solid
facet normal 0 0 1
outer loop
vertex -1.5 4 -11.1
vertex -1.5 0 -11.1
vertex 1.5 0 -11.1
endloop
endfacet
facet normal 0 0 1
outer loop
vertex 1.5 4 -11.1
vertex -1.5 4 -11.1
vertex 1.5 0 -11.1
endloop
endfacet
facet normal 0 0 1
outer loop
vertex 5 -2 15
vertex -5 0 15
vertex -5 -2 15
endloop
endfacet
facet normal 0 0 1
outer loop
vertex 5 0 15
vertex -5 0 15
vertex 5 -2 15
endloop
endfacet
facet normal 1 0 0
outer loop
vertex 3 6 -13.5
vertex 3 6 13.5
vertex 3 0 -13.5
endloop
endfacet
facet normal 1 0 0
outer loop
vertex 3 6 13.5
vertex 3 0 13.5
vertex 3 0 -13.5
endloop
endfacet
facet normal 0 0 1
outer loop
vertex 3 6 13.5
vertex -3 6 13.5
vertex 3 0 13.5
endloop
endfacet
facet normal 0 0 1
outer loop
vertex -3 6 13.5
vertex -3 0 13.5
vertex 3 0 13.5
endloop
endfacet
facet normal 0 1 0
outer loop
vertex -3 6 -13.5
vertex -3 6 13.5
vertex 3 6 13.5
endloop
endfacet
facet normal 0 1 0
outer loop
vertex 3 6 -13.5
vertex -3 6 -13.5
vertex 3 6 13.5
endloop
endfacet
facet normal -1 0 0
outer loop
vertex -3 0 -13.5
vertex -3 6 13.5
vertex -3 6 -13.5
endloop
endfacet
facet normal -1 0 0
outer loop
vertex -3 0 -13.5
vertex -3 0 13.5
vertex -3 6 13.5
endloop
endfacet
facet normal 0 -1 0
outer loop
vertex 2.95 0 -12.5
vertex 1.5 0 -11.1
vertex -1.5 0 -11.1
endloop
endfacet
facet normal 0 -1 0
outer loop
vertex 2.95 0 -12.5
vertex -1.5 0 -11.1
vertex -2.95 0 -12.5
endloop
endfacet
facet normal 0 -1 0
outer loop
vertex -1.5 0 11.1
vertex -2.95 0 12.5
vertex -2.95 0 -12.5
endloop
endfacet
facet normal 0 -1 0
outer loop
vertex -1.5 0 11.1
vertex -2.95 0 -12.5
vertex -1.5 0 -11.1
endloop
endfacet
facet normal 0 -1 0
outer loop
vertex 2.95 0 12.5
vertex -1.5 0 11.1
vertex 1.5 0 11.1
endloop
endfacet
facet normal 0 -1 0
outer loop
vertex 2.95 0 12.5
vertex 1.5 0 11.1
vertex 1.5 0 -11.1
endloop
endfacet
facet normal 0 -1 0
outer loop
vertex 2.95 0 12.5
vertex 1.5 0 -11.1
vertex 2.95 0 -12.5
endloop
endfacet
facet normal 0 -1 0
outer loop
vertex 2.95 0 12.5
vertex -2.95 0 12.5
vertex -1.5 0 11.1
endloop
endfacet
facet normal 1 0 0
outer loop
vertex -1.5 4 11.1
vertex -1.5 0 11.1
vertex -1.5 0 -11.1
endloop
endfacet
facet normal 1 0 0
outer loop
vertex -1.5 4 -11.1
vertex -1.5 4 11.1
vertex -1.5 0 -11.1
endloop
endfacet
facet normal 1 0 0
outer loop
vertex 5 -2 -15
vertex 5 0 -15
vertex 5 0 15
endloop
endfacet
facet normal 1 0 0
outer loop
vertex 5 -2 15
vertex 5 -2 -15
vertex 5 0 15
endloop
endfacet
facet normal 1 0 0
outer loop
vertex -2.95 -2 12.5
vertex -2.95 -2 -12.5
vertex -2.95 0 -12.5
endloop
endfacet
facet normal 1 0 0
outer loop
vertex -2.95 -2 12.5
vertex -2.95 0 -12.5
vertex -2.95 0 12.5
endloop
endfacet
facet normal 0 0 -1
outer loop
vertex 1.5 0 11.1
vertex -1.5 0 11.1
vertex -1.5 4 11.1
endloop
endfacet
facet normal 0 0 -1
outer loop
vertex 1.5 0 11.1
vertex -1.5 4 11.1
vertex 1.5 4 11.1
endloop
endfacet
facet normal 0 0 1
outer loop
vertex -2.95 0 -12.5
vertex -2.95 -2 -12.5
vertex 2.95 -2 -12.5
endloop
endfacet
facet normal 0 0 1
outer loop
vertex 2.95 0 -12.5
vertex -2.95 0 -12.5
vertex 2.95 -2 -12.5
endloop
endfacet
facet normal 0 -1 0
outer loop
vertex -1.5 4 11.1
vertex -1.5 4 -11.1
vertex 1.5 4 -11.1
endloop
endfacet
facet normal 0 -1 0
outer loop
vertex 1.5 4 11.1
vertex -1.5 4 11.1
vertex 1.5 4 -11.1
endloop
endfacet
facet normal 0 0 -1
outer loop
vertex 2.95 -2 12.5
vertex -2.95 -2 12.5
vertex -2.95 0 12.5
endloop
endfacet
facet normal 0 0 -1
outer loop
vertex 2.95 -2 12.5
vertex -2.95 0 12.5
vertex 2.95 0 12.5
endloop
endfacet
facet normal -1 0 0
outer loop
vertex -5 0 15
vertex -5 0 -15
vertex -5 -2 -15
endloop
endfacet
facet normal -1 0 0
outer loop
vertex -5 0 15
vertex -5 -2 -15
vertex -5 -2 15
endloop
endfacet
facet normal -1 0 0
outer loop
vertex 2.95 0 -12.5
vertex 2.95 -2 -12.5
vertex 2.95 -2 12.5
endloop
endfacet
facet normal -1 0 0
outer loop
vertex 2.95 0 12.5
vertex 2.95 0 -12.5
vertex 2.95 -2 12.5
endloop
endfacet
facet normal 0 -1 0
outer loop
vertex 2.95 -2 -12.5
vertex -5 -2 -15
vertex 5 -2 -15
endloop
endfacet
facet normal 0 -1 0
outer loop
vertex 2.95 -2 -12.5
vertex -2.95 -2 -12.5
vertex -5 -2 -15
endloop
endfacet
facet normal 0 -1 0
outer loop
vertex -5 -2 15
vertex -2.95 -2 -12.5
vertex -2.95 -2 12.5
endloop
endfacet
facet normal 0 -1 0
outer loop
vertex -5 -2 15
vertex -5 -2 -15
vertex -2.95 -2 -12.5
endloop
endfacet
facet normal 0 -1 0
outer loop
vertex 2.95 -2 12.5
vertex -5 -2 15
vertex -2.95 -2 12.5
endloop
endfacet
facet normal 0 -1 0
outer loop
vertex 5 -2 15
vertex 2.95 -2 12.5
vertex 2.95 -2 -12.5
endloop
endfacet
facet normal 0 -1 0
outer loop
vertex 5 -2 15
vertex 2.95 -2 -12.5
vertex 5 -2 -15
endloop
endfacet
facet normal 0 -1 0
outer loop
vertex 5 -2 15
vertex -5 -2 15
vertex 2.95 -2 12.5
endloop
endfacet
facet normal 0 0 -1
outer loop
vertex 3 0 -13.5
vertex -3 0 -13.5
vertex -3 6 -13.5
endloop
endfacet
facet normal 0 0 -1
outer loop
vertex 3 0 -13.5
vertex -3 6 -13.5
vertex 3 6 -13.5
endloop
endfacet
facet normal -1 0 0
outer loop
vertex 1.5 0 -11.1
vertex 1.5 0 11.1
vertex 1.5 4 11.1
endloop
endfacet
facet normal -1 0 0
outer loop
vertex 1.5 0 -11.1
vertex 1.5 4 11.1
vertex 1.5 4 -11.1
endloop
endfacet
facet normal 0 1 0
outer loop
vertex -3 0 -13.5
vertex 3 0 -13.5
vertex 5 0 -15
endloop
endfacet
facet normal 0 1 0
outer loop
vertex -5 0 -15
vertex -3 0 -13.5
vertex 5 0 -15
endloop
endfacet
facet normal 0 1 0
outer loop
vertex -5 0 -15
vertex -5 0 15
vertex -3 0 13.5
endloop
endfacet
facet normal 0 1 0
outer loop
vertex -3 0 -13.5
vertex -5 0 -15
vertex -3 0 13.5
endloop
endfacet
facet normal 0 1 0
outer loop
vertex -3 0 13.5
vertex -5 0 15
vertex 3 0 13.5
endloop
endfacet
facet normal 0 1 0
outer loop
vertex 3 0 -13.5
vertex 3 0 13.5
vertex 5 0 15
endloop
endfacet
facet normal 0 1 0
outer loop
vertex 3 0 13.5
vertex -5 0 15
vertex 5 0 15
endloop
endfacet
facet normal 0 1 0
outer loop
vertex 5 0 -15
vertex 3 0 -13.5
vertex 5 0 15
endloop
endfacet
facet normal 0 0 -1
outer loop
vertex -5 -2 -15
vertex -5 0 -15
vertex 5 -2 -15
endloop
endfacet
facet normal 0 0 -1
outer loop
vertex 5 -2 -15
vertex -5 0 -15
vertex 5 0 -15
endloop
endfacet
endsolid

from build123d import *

# Parameters (mm, degrees)
SKETCH_1_W          = 6
SKETCH_1_H          = 27
SKETCH_1_W_2        = 3
SKETCH_1_H_2        = 22.2
EXTRUDE_1_DEPTH     = 4
SKETCH_2_W          = 6
SKETCH_2_H          = 27
EXTRUDE_2_DEPTH     = 2
SKETCH_3_W          = 10
SKETCH_3_H          = 30
EXTRUDE_3_DEPTH     = 2
SKETCH_4_W          = 5.9
SKETCH_4_H          = 25
CUT_EXTRUDE_3_DEPTH = 2


with BuildPart() as part:
    # 草图1 → 凸台-拉伸1 (new body)
    with BuildSketch(Plane(origin=(0, 0, 0), x_dir=(1, 0, 0), z_dir=(0, 1, 0))):
        Rectangle(SKETCH_1_W, SKETCH_1_H)
        Rectangle(SKETCH_1_W_2, SKETCH_1_H_2, mode=Mode.SUBTRACT)
    extrude(amount=EXTRUDE_1_DEPTH)

    # 草图2 → 凸台-拉伸2 (add)
    with BuildSketch(Plane(origin=(0, 4, 0), x_dir=(1, 0, 0), z_dir=(0, 1, 0))):
        Rectangle(SKETCH_2_W, SKETCH_2_H)
    extrude(amount=EXTRUDE_2_DEPTH)

    # 草图3 → 凸台-拉伸3 (add)
    with BuildSketch(Plane.XZ):
        Rectangle(SKETCH_3_W, SKETCH_3_H)
    extrude(amount=EXTRUDE_3_DEPTH)

    # 草图4 → 切除-拉伸3 (cut)
    with BuildSketch(Plane.XZ.offset(2)):
        Rectangle(SKETCH_4_W, SKETCH_4_H)
    extrude(amount=-CUT_EXTRUDE_3_DEPTH, mode=Mode.SUBTRACT)


solid = part.part
